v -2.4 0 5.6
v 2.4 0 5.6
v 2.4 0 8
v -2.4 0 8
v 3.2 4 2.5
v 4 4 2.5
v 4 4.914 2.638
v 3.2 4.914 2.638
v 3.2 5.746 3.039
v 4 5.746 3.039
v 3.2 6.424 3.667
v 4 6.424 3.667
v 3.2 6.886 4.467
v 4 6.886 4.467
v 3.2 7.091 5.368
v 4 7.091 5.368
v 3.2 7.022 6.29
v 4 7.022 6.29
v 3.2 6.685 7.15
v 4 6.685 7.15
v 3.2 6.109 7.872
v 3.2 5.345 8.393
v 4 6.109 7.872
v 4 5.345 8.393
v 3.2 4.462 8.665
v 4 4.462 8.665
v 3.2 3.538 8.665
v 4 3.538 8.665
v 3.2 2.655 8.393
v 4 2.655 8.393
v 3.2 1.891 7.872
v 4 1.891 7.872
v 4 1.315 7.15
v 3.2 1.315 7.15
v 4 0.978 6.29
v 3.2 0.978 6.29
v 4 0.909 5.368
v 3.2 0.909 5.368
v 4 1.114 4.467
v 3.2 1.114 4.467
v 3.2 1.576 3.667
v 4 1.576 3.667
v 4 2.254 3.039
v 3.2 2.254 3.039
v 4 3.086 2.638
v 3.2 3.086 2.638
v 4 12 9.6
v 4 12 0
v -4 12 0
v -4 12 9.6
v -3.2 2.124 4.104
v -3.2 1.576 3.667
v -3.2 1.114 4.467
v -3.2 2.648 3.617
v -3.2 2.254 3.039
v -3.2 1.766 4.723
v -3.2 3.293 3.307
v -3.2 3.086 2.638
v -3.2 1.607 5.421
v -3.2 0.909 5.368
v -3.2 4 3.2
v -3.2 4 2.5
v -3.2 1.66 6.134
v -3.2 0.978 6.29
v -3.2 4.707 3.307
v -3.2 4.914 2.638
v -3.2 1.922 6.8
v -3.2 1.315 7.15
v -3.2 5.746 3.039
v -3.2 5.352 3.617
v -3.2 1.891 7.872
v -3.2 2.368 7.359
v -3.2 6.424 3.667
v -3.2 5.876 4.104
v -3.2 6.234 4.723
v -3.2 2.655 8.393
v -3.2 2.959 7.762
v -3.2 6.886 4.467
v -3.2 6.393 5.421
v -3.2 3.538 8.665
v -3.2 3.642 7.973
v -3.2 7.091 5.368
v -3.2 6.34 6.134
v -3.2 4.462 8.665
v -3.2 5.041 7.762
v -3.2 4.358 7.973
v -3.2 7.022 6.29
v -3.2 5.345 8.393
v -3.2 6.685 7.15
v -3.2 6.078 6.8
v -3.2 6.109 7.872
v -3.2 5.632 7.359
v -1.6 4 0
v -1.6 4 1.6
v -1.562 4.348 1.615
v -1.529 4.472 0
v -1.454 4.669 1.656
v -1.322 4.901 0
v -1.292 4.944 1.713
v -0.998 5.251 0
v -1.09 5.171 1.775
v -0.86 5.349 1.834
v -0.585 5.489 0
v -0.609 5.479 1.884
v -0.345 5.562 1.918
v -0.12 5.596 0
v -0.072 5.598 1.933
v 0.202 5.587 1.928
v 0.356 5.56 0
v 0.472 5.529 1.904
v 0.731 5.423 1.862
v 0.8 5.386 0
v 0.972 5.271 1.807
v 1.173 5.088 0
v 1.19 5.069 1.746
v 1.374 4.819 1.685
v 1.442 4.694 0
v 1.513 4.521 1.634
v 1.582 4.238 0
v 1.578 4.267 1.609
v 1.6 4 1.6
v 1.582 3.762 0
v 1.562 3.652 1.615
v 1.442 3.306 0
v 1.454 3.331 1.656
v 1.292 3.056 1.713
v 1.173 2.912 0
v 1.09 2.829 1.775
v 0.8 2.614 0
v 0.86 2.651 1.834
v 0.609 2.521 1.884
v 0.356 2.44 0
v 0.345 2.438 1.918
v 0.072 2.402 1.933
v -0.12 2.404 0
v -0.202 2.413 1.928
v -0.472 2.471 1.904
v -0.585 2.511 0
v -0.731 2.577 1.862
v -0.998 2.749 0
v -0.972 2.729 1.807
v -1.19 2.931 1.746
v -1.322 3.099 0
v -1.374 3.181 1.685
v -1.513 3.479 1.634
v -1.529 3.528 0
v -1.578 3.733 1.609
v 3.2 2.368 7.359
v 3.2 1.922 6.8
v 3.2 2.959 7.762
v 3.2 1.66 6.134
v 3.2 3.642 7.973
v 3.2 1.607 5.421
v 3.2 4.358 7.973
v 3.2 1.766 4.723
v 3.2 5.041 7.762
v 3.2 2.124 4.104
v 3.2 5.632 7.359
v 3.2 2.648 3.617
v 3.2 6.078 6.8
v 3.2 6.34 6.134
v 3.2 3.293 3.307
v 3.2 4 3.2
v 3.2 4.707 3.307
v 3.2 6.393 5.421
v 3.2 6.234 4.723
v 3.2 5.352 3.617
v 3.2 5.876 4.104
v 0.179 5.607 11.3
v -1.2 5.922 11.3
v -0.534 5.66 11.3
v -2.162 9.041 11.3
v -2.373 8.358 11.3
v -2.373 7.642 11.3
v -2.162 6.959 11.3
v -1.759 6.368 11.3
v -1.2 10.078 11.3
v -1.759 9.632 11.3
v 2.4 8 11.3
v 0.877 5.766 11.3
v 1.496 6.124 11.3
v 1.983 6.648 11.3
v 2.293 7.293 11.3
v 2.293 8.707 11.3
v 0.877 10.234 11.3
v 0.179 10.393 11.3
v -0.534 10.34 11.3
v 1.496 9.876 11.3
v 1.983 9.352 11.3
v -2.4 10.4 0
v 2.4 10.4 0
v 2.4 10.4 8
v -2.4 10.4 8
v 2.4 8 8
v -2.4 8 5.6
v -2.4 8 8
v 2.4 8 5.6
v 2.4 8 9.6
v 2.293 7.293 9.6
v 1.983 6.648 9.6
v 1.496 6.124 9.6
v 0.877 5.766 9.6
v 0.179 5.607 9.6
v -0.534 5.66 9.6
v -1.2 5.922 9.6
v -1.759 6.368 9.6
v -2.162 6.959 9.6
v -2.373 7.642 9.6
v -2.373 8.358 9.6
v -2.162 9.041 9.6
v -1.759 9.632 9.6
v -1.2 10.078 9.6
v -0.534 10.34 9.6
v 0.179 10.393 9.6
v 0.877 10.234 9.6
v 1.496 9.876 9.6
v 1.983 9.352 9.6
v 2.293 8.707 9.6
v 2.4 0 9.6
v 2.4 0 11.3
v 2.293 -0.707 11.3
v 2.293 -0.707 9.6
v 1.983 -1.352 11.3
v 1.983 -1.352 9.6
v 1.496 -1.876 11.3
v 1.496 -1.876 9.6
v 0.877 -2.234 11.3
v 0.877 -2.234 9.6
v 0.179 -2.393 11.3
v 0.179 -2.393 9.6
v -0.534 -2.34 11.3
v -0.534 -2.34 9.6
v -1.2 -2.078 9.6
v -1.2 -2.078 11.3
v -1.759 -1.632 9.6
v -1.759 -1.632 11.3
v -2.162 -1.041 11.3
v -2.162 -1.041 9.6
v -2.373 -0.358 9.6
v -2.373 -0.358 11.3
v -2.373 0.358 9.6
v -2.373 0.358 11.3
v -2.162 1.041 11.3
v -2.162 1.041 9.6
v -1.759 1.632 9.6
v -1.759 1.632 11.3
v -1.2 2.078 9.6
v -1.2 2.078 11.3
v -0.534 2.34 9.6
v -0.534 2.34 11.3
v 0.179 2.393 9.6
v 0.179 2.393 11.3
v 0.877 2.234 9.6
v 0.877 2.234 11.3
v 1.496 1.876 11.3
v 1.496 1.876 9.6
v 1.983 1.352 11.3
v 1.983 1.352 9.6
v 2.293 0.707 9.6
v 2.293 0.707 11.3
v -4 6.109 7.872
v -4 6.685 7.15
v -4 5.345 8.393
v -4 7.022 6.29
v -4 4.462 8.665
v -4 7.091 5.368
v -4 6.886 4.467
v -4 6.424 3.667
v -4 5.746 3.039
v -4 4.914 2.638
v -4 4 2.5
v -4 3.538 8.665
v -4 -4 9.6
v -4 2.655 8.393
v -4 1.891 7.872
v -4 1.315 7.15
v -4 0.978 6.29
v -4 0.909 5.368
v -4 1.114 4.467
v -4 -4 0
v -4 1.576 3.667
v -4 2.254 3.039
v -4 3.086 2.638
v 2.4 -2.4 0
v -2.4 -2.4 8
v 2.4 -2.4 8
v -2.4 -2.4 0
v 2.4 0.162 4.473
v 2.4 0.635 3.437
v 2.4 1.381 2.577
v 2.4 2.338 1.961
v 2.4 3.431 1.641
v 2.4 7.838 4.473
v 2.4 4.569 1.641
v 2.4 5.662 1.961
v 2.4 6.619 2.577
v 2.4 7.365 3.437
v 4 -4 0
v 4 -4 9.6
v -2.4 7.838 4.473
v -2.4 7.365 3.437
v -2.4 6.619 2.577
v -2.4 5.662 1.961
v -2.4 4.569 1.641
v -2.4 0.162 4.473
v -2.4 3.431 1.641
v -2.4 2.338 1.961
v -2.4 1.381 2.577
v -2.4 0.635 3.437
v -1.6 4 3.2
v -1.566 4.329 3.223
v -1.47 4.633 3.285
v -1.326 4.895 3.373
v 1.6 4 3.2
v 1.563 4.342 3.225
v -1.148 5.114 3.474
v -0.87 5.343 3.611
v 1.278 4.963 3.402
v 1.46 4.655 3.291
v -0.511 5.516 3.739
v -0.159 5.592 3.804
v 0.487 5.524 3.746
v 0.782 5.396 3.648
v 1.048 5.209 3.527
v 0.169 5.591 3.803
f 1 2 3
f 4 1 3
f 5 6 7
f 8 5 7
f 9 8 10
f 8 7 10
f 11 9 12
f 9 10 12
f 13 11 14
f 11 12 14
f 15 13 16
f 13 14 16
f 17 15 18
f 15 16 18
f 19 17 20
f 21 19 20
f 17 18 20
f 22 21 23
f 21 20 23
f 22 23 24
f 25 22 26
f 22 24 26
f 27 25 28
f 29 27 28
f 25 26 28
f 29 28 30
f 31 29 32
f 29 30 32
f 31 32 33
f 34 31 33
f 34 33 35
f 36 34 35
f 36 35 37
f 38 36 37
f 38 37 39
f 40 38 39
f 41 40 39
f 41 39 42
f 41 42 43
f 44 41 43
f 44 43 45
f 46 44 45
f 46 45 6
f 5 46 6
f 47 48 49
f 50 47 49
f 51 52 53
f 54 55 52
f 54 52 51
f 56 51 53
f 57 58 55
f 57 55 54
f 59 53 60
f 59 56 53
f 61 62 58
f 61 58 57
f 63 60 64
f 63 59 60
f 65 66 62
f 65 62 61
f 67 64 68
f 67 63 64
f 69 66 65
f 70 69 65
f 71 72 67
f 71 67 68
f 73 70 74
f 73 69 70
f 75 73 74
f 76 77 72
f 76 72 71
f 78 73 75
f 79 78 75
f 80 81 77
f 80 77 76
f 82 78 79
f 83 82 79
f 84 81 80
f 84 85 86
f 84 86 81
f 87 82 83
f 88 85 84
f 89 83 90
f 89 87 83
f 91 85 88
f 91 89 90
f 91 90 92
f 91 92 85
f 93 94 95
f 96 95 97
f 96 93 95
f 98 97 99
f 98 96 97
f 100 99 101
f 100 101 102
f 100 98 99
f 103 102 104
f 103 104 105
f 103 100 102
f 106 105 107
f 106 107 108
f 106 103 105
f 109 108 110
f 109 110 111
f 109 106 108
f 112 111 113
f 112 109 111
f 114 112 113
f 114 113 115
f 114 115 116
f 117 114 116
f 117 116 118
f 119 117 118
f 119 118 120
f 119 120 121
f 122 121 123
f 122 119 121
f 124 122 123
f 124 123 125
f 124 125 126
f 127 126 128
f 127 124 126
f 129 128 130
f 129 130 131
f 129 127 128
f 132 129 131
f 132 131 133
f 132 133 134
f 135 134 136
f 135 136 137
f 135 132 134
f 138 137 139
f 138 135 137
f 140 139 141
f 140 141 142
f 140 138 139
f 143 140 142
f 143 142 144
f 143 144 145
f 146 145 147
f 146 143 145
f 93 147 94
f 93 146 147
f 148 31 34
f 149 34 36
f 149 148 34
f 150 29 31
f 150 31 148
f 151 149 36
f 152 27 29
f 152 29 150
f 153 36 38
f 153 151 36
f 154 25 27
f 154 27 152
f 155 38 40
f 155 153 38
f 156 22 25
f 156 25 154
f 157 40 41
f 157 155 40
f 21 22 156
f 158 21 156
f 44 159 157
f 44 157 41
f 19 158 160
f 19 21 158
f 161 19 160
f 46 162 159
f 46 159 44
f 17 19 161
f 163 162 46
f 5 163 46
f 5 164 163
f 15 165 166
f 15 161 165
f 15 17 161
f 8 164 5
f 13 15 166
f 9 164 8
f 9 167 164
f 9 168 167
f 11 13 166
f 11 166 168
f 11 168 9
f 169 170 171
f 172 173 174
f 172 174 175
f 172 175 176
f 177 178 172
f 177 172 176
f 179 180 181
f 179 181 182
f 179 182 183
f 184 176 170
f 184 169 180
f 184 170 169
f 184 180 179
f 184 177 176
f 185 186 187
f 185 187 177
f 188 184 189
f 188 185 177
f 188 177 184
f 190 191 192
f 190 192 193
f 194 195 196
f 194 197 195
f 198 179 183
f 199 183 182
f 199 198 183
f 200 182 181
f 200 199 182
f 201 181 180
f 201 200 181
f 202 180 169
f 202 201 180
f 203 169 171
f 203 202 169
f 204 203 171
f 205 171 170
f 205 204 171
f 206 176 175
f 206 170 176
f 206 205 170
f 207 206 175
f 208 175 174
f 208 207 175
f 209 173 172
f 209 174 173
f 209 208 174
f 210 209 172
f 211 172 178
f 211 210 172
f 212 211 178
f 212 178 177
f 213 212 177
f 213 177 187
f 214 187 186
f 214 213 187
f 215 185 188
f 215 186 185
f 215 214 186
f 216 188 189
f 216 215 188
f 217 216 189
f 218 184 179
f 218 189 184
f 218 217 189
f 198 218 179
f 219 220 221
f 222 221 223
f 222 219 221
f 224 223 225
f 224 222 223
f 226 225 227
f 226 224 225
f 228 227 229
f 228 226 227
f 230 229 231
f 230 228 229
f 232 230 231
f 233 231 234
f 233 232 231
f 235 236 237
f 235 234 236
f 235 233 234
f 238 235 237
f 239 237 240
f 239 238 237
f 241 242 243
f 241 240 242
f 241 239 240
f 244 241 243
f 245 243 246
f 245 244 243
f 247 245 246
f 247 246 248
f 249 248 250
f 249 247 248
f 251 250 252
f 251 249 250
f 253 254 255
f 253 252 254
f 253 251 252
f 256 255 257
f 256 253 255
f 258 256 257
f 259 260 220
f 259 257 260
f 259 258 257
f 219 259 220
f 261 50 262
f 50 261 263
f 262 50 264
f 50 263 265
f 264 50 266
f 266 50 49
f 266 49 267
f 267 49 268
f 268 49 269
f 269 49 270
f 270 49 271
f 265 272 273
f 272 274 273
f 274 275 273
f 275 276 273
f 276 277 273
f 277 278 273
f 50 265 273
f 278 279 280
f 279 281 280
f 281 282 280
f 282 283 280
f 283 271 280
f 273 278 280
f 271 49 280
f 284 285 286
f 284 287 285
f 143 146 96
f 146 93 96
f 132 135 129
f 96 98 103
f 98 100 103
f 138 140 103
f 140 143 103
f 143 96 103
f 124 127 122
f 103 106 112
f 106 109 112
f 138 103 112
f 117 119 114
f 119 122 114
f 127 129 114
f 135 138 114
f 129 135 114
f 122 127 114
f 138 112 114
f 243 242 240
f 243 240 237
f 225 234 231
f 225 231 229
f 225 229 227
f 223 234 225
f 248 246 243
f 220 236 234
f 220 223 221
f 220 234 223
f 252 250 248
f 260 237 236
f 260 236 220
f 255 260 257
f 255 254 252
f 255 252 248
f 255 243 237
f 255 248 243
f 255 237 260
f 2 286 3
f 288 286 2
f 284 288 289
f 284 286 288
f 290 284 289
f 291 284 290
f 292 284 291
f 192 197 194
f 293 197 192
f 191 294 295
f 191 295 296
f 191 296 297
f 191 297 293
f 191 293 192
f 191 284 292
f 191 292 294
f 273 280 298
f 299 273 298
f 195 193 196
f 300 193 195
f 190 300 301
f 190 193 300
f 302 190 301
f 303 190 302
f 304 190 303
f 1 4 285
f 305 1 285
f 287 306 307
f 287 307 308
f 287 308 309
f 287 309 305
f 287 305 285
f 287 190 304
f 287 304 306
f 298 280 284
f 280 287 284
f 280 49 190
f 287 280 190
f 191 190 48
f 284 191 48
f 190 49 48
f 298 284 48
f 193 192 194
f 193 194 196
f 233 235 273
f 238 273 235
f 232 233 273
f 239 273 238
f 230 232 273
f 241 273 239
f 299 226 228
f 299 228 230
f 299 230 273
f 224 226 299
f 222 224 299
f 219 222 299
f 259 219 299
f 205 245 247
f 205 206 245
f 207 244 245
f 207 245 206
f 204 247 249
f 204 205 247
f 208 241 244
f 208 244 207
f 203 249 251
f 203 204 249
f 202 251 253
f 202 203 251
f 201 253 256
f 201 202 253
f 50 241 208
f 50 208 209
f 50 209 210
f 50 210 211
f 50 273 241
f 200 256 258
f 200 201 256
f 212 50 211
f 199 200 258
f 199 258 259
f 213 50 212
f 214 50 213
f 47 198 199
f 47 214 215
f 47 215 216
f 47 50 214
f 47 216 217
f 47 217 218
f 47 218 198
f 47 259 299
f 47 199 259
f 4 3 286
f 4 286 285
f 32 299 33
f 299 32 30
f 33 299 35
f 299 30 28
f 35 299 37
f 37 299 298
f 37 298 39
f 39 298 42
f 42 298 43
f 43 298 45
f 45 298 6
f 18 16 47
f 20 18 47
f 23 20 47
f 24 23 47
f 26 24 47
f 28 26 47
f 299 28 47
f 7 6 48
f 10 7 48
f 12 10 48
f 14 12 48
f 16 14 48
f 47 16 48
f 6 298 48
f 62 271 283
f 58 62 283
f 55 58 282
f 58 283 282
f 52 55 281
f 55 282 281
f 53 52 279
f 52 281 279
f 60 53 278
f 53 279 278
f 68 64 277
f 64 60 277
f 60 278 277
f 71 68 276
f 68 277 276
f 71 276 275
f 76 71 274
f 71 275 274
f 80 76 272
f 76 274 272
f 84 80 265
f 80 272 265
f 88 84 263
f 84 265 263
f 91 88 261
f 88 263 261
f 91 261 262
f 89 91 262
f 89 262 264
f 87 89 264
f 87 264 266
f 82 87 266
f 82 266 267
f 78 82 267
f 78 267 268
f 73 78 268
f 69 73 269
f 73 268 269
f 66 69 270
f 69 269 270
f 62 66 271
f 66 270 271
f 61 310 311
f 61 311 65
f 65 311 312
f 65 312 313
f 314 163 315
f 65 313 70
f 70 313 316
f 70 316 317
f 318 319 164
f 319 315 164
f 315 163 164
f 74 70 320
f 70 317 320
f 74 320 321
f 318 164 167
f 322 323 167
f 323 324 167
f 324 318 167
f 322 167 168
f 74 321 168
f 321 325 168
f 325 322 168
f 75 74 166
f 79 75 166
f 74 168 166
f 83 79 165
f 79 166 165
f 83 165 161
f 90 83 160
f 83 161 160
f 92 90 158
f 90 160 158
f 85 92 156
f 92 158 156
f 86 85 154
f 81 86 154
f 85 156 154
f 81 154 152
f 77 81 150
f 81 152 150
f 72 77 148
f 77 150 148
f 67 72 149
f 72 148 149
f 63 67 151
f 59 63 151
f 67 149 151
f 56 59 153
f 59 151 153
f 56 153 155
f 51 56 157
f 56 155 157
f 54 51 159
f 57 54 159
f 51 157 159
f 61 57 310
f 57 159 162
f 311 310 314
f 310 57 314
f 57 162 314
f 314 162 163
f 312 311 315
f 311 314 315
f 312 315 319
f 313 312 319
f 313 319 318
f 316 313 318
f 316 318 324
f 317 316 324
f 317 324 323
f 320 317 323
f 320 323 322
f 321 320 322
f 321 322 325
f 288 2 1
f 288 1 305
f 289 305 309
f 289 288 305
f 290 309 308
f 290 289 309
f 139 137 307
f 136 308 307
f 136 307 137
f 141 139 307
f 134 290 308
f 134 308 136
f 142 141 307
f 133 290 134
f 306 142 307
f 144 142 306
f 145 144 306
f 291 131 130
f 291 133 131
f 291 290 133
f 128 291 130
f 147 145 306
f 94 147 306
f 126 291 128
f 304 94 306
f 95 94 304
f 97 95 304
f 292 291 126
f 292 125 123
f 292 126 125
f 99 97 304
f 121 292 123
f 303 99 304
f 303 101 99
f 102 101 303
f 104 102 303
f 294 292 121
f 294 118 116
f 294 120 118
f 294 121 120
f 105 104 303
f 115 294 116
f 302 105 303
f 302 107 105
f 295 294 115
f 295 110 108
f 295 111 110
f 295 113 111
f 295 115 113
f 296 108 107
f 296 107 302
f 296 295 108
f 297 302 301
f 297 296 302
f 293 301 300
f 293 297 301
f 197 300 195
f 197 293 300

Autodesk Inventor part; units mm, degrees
ref_plane "YZ Plane" through (0, 0, 0) normal (1, 0, 0) x (0, 1, 0)
ref_plane "XZ Plane" through (0, 0, 0) normal (0, 1, 0) x (-1, 0, 0)
sketch "Sketch1" plane through (0, 0, 0) normal (0, 0, 1) x (1, 0, 0)
  line L0 (-4, -4) -> (4, -4)
  line L1 (4, -4) -> (4, 4)
  line L2 (4, 4) -> (-4, 4)
  line L3 (-4, 4) -> (-4, -4)
  line L4 (-4, -4) -> (4, 4) construction
  line L5 (4, -4) -> (-4, 4) construction
  circle A0 centre (0, 0) radius 2.4
  dimension "d0" = 8
  dimension "d1" = 8
  dimension "d2" = 4.8
extrude "Extrusion1" add sketch "Sketch1" along normal blind 9.6 contours L3 L2 L1 L0 | A0
extrude "Extrusion2" add sketch "Sketch1" along normal blind 11.3 contours A0
pattern_linear "Rectangular Pattern1" count 2 spacing 8 along (0, 1, 0) of "Extrusion1", "Extrusion2"
sketch "Sketch3" plane through (0, 0, 0) normal (0, 0, -1) x (-1, 0, 0)
  line L0 (4, -4) -> (-4, -4) projected
  line L1 (4, 12) -> (4, -4) projected
  line L2 (-4, 12) -> (4, 12) projected
  line L3 (-4, -4) -> (-4, 12) projected
  line L4 (2.4, 10.4) -> (2.4, -2.4)
  line L5 (2.4, -2.4) -> (-2.4, -2.4)
  line L6 (-2.4, -2.4) -> (-2.4, 10.4)
  line L7 (-2.4, 10.4) -> (2.4, 10.4)
  circle A0 centre (0, 4) radius 1.6
  line L8 (0, -2.4) -> (0, 4) construction
  point P0 (0, 0)
  dimension "d22" = 1.6
  dimension "d23" = 3.2
  dimension "d24" = 8
extrude "Extrusion6" cut sketch "Sketch3" against normal blind 8 contours L4 L5 L6 L7
sketch "Sketch2" plane through (4, -4, 9.6) normal (1, 0, 0) x (0, 0, -1)
  circle A0 centre (4, 8) radius 2.4
  circle A1 centre (4, 8) radius 3.1
  circle A2 centre (4, 8) radius 4
  line L0 (0, 0) -> (0, 16) projected
  line L1 (4, 4) -> (0, 4)
  line L2 (4, 12) -> (0, 12)
  line L3 (9.6, 0) -> (9.6, 16) projected
  line L4 (9.6, 0) -> (0, 0) projected
  point P0 (9.6, 4)
  dimension "d12" = 4.8
  dimension "d14" = 6.2
  dimension "d29" = 8
  dimension "d30" = 8
  dimension "d31" = 5.6
ref_plane "Work Plane1" through (0, -4, 9.6) normal (1, 0, 0) x (0, 0, -1)
extrude "Extrusion4" cut sketch "Sketch2" against normal up to surface (8 mm away) from surface at 0 contours A0
extrude "Extrusion5" cut sketch "Sketch2" against normal blind 0.8 contours A1
mirror "Mirror1" about plane through (0, -4, 9.6) normal (1, 0, 0) of "Extrusion5"
pattern_of_one "Rectangular Pattern2"
extrude "Extrusion7" add sketch "Sketch2" against normal up to surface (4.8 mm away) from surface at -1.6 contours A1 | A2 | A2 L0 L2 | L1 L0 A2
equation "\"d11\" = d0"
equation "\"d21\" = d0"
properties part number "real LEGO Technic Brick 1x2 with Holes"
